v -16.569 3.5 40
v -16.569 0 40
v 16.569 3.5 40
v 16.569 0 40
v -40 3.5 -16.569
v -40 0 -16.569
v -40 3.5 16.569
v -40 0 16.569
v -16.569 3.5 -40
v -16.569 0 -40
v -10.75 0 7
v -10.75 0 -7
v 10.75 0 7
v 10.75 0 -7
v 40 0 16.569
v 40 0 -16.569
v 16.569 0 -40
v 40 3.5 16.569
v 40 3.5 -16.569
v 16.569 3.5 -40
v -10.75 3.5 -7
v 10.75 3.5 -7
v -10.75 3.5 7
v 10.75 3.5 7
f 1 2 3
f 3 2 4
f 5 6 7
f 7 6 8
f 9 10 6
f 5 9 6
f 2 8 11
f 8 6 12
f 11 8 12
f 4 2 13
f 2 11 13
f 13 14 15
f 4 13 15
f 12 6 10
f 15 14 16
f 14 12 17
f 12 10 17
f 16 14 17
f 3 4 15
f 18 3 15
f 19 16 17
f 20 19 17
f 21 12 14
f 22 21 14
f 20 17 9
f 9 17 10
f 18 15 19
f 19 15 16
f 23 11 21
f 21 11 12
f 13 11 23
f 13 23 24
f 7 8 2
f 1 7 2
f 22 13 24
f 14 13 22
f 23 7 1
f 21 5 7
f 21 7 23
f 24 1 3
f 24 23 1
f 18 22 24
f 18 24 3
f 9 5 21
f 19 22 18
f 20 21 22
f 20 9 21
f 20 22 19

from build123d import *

# Parameters (mm, degrees)
SKETCH1_W           = 21.5
SKETCH1_H           = 14
BOSS_EXTRUDE1_DEPTH = 3.5


with BuildPart() as part:
    # Sketch1 → Boss-Extrude1 (new body)
    with BuildSketch(Plane(origin=(0, 0, 0), x_dir=(1, 0, 0), z_dir=(0, 1, 0))):
        Polygon((40, 16.568542495), (16.568542495, 40), (-16.568542495, 40), (-40, 16.568542495), (-40, -16.568542495), (-16.568542495, -40), (16.568542495, -40), (40, -16.568542495), align=None)
        Rectangle(SKETCH1_W, SKETCH1_H, mode=Mode.SUBTRACT)
    extrude(amount=BOSS_EXTRUDE1_DEPTH)


solid = part.part
